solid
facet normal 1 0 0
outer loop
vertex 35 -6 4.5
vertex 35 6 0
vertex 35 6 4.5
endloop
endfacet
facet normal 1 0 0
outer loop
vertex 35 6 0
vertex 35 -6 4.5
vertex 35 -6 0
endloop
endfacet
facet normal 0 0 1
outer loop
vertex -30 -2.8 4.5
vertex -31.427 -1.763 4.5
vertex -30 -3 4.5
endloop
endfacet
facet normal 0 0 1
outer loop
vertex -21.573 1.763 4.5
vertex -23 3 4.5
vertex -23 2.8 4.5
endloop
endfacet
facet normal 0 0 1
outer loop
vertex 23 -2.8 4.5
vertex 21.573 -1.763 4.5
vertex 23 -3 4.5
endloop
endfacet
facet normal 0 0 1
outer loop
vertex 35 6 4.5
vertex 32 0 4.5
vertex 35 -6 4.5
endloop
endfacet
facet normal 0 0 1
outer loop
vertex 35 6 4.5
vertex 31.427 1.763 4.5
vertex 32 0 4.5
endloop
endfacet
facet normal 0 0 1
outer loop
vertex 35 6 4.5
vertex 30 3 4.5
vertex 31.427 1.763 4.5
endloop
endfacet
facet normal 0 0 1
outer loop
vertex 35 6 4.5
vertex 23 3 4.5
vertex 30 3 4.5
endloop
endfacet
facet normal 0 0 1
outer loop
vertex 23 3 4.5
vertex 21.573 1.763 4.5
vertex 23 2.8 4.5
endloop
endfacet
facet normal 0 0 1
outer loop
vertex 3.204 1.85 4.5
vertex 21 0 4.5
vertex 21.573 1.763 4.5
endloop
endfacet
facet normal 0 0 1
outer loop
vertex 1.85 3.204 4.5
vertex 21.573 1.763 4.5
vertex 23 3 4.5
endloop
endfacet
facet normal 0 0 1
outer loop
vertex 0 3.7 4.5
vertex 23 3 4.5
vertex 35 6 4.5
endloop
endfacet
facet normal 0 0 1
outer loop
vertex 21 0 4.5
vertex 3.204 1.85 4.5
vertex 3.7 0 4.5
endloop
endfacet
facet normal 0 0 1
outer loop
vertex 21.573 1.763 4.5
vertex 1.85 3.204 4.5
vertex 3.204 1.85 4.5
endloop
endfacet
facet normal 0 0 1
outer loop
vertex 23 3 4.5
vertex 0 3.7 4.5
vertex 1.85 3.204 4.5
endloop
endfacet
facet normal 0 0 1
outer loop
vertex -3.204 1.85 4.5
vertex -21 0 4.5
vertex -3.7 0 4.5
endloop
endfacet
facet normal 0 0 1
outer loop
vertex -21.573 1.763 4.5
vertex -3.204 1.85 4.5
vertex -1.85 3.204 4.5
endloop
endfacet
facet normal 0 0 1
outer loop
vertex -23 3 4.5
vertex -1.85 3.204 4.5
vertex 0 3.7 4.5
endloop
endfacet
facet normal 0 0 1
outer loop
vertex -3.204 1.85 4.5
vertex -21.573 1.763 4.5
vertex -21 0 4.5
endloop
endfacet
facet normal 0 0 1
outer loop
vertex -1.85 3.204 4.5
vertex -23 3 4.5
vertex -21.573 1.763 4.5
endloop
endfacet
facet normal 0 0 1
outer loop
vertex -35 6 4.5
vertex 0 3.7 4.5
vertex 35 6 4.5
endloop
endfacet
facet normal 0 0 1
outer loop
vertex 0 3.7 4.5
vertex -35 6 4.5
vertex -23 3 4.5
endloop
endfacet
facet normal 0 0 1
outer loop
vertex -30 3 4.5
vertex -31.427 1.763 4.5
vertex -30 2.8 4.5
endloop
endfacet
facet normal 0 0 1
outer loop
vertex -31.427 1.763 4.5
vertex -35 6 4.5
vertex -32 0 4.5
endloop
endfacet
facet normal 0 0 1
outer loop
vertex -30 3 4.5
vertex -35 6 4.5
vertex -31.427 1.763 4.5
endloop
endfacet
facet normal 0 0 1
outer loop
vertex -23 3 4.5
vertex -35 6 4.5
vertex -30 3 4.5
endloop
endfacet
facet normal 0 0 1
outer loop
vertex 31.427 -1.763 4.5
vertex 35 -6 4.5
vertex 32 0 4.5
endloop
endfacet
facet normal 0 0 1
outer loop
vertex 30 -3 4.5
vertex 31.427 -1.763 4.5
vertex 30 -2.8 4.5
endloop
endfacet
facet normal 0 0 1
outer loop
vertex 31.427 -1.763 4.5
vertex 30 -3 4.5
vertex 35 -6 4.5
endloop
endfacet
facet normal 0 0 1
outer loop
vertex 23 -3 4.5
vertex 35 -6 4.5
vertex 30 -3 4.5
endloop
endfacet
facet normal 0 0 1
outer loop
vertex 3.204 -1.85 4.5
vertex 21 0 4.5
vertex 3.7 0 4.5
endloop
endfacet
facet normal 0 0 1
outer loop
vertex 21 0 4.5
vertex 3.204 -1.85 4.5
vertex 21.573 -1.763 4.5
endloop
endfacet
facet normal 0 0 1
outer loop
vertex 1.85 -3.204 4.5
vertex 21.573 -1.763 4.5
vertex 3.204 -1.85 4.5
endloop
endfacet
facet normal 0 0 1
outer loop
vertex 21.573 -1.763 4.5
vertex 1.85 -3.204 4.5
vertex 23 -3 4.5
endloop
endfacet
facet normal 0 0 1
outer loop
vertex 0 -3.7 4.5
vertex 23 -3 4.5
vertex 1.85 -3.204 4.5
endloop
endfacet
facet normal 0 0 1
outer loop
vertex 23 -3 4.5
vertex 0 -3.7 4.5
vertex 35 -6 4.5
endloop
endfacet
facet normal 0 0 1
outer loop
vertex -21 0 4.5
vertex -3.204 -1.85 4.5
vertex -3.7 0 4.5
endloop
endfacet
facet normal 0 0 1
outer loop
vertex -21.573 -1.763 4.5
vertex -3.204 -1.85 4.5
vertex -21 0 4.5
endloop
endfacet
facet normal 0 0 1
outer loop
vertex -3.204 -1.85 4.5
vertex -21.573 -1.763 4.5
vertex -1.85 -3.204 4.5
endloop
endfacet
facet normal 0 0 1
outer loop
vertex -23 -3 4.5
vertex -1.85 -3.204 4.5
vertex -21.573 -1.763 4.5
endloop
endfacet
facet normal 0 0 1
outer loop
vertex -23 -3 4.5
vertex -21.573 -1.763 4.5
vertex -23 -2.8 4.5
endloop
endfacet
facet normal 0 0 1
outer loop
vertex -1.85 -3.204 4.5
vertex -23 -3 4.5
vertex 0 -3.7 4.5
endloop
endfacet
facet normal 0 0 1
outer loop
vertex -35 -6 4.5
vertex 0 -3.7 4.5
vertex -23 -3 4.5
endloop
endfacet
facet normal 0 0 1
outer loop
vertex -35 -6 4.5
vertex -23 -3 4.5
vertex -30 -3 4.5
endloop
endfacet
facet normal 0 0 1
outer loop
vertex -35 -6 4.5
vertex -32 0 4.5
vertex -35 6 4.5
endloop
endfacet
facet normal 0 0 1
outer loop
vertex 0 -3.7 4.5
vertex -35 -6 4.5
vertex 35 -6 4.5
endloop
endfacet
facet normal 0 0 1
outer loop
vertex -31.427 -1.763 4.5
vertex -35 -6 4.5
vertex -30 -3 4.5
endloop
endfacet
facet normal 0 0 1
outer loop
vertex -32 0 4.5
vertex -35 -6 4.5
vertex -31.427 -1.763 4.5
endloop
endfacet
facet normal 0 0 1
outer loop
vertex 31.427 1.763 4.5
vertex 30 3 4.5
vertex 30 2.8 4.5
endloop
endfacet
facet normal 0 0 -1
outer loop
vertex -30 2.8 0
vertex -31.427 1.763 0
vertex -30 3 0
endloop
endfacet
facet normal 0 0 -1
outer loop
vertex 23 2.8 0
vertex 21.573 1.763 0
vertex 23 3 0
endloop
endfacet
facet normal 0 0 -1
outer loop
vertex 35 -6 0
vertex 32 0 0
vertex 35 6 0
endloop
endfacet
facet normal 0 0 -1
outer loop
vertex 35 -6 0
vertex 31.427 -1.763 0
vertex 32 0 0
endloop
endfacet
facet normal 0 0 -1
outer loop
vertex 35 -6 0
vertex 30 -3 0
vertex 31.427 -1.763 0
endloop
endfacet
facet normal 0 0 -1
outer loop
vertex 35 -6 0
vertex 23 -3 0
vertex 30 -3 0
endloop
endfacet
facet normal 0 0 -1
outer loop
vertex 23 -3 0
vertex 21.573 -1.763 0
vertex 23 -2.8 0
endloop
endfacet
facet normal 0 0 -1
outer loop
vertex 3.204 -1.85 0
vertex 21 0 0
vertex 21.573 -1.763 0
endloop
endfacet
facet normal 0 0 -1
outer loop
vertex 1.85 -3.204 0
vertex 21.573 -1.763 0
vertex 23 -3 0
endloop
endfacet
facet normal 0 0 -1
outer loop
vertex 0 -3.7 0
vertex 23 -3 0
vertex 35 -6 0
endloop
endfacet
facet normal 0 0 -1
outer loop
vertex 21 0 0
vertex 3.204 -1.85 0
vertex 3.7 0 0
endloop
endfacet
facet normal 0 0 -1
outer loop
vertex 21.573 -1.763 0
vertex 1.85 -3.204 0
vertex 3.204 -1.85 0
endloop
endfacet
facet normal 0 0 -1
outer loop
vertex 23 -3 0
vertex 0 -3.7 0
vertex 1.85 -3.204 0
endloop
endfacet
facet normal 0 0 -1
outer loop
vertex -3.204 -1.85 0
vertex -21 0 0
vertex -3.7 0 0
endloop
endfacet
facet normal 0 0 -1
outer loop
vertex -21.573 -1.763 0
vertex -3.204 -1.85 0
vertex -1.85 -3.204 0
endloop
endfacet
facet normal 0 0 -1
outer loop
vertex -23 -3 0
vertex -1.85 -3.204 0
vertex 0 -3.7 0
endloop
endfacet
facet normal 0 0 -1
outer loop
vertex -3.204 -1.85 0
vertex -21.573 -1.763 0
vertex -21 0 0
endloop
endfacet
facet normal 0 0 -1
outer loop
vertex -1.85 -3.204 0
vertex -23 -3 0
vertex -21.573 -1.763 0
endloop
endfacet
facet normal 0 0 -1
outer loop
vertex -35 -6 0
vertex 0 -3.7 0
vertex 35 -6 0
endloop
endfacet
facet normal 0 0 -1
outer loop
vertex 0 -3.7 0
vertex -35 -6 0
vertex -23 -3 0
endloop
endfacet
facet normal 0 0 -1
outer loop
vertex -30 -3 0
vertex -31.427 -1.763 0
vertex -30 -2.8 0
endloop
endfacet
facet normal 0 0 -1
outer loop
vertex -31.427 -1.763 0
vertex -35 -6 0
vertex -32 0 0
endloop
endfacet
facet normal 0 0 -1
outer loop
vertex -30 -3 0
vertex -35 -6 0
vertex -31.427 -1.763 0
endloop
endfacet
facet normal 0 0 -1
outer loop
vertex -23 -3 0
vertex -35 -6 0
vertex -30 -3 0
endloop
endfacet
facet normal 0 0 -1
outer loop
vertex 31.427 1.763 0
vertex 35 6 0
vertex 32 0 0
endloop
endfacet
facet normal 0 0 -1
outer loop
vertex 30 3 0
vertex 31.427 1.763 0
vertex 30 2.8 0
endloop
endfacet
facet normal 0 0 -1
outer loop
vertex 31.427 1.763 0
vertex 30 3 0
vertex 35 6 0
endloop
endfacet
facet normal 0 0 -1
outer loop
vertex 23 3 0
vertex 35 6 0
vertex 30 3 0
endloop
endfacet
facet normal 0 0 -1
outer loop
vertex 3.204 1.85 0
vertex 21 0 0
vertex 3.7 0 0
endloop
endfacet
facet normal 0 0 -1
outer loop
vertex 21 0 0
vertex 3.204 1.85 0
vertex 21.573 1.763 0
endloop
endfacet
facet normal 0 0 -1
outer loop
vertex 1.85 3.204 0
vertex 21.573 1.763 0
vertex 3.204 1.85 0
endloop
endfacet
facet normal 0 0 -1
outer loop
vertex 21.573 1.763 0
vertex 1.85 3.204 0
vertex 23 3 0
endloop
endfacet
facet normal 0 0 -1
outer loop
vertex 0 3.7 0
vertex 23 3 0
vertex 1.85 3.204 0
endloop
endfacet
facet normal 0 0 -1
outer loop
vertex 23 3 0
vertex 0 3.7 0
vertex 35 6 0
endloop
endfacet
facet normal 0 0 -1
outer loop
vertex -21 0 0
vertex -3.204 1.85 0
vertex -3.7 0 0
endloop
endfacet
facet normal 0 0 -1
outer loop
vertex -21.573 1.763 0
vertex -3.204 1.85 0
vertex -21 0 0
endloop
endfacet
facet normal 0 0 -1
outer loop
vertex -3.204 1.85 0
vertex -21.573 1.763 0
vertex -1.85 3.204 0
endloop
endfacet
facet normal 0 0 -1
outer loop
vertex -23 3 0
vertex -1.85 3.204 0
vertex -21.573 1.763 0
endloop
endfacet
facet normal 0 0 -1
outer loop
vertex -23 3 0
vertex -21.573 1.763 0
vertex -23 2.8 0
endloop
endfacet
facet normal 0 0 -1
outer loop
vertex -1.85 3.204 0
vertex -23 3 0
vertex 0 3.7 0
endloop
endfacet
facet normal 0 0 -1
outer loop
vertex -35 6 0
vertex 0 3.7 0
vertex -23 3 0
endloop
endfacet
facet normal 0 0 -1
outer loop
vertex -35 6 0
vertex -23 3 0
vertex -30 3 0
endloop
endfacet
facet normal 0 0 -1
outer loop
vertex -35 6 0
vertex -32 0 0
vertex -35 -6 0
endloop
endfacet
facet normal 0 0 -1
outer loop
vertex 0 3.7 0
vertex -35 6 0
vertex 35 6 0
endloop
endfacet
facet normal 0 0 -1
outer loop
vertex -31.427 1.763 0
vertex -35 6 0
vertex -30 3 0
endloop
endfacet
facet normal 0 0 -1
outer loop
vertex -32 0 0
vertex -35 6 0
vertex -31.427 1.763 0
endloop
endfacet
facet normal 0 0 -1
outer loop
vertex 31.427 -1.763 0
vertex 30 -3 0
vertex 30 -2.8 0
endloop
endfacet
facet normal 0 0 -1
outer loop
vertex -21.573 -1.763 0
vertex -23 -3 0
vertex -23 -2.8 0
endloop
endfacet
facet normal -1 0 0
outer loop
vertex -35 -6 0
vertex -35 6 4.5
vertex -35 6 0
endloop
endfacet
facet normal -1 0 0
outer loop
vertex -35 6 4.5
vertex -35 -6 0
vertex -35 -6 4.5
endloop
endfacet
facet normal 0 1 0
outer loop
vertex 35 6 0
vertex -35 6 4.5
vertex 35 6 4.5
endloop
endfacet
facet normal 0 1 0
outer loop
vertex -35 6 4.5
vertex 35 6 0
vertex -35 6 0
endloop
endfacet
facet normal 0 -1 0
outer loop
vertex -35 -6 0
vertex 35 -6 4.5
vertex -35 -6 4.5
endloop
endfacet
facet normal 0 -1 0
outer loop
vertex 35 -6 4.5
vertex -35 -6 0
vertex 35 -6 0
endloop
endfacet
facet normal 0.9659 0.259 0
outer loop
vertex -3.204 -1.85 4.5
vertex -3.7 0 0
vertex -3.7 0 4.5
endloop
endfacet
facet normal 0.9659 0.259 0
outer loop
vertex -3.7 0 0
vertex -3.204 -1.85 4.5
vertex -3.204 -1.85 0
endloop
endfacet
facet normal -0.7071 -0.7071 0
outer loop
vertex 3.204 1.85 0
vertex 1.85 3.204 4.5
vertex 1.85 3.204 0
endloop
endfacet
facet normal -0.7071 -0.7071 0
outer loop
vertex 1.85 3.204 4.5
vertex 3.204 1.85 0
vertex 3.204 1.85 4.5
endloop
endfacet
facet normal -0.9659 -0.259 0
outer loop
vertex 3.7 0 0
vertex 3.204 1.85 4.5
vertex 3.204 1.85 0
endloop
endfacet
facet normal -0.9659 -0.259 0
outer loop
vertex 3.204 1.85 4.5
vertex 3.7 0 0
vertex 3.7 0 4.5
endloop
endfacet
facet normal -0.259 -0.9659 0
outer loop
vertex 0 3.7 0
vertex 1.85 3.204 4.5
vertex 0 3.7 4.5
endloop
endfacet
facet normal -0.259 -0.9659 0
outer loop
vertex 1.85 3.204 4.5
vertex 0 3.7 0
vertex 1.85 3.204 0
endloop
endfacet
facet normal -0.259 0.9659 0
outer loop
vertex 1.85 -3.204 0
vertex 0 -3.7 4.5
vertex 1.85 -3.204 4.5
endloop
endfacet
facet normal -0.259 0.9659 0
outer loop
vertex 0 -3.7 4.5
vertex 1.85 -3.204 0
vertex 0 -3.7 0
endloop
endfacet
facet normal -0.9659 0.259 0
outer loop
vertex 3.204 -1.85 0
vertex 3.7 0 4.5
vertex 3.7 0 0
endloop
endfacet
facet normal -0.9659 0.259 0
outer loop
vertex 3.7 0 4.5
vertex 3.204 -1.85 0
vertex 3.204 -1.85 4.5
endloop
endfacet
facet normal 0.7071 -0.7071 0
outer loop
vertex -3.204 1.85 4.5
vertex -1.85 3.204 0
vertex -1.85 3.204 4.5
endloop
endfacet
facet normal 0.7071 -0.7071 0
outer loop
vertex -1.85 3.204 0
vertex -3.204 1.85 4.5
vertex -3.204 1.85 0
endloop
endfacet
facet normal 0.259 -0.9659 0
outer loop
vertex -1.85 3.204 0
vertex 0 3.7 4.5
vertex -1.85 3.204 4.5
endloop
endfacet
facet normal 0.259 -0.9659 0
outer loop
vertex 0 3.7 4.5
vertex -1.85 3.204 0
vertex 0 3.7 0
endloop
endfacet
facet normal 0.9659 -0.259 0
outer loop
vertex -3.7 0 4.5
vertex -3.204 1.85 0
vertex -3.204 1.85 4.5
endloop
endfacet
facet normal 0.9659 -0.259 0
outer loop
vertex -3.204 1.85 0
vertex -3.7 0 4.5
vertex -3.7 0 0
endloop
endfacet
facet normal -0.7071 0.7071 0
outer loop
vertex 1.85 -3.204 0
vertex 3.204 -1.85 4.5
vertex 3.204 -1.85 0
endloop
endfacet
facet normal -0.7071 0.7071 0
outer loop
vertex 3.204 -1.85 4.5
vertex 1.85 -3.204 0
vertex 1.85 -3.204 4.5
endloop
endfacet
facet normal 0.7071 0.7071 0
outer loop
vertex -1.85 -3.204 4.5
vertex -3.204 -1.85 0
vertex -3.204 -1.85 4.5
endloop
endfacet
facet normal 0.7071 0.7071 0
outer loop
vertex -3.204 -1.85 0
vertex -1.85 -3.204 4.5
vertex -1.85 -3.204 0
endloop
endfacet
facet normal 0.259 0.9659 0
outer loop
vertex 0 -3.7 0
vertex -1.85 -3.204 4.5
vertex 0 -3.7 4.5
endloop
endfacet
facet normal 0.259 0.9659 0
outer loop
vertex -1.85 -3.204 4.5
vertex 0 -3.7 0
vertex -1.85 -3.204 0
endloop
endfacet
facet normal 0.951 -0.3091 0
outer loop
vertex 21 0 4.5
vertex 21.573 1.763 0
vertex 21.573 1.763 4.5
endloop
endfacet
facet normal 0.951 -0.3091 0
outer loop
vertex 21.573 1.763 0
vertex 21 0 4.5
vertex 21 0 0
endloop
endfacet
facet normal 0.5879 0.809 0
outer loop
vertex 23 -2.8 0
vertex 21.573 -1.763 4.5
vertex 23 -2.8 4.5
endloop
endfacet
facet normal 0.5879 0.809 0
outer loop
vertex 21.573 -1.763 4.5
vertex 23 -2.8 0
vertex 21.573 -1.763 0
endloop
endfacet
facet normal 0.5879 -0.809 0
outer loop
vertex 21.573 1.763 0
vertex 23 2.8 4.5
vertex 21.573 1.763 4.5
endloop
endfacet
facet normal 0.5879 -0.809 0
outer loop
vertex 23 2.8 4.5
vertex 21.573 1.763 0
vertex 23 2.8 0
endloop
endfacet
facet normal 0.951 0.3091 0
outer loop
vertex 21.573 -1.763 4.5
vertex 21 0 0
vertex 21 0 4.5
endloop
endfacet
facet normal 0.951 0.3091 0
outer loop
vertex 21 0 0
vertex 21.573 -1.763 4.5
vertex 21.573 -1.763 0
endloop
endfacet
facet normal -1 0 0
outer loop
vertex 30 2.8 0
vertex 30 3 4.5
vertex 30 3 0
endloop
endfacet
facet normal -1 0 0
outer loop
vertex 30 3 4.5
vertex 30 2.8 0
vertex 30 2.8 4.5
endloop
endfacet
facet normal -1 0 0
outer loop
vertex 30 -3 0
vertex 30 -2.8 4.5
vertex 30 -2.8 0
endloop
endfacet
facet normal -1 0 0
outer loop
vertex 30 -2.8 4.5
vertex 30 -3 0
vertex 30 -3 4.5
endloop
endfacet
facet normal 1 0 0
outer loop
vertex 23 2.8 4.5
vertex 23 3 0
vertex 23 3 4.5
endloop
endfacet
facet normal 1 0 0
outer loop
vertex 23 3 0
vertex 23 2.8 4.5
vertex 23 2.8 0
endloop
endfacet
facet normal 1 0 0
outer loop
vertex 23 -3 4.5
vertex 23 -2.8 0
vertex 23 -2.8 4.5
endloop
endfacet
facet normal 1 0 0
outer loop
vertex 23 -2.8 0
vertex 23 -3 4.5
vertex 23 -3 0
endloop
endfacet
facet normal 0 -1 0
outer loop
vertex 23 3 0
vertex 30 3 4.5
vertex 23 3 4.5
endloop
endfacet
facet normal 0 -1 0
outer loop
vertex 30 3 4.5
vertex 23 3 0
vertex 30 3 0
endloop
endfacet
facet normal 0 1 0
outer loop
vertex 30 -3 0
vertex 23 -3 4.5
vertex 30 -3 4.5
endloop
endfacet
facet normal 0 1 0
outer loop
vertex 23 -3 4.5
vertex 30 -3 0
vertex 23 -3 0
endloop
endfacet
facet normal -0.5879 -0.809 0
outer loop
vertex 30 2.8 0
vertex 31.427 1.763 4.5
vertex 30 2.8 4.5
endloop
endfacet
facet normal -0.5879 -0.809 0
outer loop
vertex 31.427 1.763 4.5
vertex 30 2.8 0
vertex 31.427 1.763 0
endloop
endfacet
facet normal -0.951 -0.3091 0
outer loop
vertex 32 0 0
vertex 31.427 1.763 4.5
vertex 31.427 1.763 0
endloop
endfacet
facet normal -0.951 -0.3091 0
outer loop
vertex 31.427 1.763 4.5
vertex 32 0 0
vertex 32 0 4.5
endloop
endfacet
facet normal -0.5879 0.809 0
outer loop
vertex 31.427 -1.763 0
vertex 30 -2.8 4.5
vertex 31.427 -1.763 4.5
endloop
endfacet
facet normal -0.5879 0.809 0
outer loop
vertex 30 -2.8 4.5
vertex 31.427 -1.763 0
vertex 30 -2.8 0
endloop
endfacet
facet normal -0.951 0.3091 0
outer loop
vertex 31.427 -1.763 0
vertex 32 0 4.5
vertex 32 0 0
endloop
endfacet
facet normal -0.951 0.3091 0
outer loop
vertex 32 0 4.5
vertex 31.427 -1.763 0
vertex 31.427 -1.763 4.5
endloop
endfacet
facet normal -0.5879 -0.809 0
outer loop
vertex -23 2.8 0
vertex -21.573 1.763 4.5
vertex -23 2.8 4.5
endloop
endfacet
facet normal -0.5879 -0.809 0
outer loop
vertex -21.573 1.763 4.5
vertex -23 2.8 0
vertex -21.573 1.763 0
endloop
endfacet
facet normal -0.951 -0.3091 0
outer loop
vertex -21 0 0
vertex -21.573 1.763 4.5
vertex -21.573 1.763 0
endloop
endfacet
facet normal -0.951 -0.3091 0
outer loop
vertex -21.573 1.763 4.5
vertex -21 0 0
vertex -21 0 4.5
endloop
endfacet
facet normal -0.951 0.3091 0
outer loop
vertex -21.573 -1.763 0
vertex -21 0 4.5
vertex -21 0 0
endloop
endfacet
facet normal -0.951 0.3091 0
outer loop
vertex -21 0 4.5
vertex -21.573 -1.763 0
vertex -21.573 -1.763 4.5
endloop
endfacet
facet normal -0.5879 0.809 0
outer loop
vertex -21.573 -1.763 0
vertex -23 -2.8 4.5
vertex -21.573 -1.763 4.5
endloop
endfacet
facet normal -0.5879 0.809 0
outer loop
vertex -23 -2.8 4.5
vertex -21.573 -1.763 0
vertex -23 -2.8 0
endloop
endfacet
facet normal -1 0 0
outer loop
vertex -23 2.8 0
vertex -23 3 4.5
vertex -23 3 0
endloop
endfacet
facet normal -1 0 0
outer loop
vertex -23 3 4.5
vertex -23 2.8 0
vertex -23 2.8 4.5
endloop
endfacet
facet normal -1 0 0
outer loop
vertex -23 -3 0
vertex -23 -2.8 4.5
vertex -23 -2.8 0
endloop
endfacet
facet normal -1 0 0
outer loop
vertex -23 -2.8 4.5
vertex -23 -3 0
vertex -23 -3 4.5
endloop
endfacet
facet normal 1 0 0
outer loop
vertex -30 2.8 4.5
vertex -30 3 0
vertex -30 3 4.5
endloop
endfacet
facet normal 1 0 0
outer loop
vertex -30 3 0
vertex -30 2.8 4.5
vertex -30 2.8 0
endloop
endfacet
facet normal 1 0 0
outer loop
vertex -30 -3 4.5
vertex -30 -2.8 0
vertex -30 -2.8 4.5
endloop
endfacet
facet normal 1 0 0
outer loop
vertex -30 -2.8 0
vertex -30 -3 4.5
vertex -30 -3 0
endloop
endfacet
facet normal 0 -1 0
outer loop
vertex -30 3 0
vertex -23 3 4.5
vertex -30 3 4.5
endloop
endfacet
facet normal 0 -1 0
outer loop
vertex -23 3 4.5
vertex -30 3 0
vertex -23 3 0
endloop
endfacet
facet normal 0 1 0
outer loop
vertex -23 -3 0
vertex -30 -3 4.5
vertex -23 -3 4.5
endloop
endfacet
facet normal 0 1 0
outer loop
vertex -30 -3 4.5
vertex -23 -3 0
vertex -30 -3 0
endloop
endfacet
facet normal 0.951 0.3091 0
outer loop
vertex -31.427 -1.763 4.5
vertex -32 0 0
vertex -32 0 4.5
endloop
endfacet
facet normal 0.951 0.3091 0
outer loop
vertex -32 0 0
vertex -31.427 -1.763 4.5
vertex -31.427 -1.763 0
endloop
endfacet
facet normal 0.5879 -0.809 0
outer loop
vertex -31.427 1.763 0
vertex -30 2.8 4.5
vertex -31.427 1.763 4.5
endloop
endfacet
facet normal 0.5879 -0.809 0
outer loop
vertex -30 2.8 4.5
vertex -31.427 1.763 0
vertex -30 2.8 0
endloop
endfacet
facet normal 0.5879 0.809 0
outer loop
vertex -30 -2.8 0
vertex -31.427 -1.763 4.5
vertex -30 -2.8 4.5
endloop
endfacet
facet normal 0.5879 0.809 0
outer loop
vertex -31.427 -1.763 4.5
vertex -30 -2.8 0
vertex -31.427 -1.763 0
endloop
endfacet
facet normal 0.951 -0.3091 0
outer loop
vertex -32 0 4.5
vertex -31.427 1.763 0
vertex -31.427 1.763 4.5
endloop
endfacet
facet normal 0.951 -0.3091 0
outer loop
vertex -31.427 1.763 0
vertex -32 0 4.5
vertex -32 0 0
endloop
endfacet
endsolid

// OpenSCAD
base_dia = 39;

mount_min = 19;
mount_max = 31;

//bottom_thickness = 2;
total_thickness = 4.5;

ptfe_hole=3.7;


difference(){
	translate(v=[-35,-6,0]) cube(size=[70,12,total_thickness]);
	

	cylinder(r=ptfe_hole, h=total_thickness);

	translate(v=[24,0,0]) cylinder(r=3, h=total_thickness);
	translate(v=[23,-3,0]) cube(size=[7,6,total_thickness]);
	translate(v=[29,0,0]) cylinder(r=3, h=total_thickness);

	translate(v=[-24,0,0]) cylinder(r=3, h=total_thickness);
	translate(v=[-30,-3,0]) cube(size=[7,6,total_thickness]);
	translate(v=[-29,0,0]) cylinder(r=3, h=total_thickness);

}
